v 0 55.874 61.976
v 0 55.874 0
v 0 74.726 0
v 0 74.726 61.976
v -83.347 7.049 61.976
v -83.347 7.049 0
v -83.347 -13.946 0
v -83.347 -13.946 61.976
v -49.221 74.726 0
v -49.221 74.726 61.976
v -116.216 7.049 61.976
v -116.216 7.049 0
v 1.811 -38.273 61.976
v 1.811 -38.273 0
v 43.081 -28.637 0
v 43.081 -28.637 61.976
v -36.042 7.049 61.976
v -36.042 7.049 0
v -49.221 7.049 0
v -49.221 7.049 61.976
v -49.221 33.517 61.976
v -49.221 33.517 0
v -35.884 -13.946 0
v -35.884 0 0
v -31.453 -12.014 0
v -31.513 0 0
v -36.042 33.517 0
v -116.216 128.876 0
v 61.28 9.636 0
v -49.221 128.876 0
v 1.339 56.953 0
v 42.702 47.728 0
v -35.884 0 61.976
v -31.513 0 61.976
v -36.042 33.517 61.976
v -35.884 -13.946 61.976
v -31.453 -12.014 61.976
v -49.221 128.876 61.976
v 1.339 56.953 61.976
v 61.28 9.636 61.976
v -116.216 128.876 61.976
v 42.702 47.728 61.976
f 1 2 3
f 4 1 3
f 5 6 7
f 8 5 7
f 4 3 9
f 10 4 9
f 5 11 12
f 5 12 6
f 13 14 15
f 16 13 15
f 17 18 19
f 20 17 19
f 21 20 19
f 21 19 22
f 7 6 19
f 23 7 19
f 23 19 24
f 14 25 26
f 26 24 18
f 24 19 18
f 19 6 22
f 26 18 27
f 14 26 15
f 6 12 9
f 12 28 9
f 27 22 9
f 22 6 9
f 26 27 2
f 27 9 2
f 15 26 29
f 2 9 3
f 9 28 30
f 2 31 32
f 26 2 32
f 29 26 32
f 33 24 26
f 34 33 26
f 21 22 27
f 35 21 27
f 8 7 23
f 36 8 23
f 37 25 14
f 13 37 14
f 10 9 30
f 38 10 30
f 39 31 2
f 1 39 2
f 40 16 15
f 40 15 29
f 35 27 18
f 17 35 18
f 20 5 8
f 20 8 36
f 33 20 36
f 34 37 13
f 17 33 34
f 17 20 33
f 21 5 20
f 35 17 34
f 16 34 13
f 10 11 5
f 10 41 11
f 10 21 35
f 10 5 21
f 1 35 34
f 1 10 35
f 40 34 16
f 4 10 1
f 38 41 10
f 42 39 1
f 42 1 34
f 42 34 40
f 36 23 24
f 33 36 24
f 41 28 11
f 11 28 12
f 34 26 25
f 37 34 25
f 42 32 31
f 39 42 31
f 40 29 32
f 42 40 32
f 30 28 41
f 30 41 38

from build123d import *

# Parameters (mm, degrees)
F0_W     = 13.1786922227
F0_H     = 41.2089657038
F0_W_2   = 66.9952295721
F0_H_2   = 54.149620235
F0_W_3   = 34.1263301671
F0_H_3   = 26.4682687528
F1_DEPTH = 61.976


with BuildPart() as f1:
    # F0 (on Top) → F1 (new body)
    with BuildSketch(Plane.XY):
        Polygon((-49.2211245, 0), (-35.8841195703, 0), (-35.8841195703, 33.5169229656), (-36.0424322773, 33.5169229656), (-36.0424322773, 7.0486542129), (-49.2211245, 7.0486542129), align=None)
        Polygon((-31.6636036608, 30.3650720171), (-31.5128481644, 0), (0, 0), (0, 55.8741530566), align=None)
        with Locations((-42.6317783887, 54.1214058176)):
            Rectangle(F0_W, F0_H)
        Polygon((0, 0), (-31.5128481644, 0), (-31.4532000547, -12.0142826496), (1.8114981332, -38.2728779304), (43.0814946911, -28.637456001), (61.2796404565, 9.6363138989), (42.7023604934, 47.7275023921), (1.3387255216, 56.9526676245), (0, 55.8741530566), align=None)
        Polygon((-116.2163540721, 7.0486542129), (-83.3474546671, 7.0486542129), (-83.3474546671, 33.5169229656), (-49.2211245, 33.5169229656), (-49.2211245, 74.7258886695), (-116.2163540721, 74.7258886695), align=None)
        with Locations((-82.7187392861, 101.800698787)):
            Rectangle(F0_W_2, F0_H_2)
        with Locations((-66.2842895836, 20.2827885893)):
            Rectangle(F0_W_3, F0_H_3)
        Polygon((-35.8841195703, 33.5169229656), (-35.8841195703, 0), (-31.5128481644, 0), (-31.6636036608, 30.3650720171), (0, 55.8741530566), (0, 74.7258886695), (-36.0424322773, 74.7258886695), (-36.0424322773, 33.5169229656), align=None)
        Polygon((-83.3474546671, -13.9464121312), (-35.8841195703, -13.9464121312), (-35.8841195703, 0), (-49.2211245, 0), (-49.2211245, 7.0486542129), (-83.3474546671, 7.0486542129), align=None)
    extrude(amount=F1_DEPTH)


solid = f1.part
